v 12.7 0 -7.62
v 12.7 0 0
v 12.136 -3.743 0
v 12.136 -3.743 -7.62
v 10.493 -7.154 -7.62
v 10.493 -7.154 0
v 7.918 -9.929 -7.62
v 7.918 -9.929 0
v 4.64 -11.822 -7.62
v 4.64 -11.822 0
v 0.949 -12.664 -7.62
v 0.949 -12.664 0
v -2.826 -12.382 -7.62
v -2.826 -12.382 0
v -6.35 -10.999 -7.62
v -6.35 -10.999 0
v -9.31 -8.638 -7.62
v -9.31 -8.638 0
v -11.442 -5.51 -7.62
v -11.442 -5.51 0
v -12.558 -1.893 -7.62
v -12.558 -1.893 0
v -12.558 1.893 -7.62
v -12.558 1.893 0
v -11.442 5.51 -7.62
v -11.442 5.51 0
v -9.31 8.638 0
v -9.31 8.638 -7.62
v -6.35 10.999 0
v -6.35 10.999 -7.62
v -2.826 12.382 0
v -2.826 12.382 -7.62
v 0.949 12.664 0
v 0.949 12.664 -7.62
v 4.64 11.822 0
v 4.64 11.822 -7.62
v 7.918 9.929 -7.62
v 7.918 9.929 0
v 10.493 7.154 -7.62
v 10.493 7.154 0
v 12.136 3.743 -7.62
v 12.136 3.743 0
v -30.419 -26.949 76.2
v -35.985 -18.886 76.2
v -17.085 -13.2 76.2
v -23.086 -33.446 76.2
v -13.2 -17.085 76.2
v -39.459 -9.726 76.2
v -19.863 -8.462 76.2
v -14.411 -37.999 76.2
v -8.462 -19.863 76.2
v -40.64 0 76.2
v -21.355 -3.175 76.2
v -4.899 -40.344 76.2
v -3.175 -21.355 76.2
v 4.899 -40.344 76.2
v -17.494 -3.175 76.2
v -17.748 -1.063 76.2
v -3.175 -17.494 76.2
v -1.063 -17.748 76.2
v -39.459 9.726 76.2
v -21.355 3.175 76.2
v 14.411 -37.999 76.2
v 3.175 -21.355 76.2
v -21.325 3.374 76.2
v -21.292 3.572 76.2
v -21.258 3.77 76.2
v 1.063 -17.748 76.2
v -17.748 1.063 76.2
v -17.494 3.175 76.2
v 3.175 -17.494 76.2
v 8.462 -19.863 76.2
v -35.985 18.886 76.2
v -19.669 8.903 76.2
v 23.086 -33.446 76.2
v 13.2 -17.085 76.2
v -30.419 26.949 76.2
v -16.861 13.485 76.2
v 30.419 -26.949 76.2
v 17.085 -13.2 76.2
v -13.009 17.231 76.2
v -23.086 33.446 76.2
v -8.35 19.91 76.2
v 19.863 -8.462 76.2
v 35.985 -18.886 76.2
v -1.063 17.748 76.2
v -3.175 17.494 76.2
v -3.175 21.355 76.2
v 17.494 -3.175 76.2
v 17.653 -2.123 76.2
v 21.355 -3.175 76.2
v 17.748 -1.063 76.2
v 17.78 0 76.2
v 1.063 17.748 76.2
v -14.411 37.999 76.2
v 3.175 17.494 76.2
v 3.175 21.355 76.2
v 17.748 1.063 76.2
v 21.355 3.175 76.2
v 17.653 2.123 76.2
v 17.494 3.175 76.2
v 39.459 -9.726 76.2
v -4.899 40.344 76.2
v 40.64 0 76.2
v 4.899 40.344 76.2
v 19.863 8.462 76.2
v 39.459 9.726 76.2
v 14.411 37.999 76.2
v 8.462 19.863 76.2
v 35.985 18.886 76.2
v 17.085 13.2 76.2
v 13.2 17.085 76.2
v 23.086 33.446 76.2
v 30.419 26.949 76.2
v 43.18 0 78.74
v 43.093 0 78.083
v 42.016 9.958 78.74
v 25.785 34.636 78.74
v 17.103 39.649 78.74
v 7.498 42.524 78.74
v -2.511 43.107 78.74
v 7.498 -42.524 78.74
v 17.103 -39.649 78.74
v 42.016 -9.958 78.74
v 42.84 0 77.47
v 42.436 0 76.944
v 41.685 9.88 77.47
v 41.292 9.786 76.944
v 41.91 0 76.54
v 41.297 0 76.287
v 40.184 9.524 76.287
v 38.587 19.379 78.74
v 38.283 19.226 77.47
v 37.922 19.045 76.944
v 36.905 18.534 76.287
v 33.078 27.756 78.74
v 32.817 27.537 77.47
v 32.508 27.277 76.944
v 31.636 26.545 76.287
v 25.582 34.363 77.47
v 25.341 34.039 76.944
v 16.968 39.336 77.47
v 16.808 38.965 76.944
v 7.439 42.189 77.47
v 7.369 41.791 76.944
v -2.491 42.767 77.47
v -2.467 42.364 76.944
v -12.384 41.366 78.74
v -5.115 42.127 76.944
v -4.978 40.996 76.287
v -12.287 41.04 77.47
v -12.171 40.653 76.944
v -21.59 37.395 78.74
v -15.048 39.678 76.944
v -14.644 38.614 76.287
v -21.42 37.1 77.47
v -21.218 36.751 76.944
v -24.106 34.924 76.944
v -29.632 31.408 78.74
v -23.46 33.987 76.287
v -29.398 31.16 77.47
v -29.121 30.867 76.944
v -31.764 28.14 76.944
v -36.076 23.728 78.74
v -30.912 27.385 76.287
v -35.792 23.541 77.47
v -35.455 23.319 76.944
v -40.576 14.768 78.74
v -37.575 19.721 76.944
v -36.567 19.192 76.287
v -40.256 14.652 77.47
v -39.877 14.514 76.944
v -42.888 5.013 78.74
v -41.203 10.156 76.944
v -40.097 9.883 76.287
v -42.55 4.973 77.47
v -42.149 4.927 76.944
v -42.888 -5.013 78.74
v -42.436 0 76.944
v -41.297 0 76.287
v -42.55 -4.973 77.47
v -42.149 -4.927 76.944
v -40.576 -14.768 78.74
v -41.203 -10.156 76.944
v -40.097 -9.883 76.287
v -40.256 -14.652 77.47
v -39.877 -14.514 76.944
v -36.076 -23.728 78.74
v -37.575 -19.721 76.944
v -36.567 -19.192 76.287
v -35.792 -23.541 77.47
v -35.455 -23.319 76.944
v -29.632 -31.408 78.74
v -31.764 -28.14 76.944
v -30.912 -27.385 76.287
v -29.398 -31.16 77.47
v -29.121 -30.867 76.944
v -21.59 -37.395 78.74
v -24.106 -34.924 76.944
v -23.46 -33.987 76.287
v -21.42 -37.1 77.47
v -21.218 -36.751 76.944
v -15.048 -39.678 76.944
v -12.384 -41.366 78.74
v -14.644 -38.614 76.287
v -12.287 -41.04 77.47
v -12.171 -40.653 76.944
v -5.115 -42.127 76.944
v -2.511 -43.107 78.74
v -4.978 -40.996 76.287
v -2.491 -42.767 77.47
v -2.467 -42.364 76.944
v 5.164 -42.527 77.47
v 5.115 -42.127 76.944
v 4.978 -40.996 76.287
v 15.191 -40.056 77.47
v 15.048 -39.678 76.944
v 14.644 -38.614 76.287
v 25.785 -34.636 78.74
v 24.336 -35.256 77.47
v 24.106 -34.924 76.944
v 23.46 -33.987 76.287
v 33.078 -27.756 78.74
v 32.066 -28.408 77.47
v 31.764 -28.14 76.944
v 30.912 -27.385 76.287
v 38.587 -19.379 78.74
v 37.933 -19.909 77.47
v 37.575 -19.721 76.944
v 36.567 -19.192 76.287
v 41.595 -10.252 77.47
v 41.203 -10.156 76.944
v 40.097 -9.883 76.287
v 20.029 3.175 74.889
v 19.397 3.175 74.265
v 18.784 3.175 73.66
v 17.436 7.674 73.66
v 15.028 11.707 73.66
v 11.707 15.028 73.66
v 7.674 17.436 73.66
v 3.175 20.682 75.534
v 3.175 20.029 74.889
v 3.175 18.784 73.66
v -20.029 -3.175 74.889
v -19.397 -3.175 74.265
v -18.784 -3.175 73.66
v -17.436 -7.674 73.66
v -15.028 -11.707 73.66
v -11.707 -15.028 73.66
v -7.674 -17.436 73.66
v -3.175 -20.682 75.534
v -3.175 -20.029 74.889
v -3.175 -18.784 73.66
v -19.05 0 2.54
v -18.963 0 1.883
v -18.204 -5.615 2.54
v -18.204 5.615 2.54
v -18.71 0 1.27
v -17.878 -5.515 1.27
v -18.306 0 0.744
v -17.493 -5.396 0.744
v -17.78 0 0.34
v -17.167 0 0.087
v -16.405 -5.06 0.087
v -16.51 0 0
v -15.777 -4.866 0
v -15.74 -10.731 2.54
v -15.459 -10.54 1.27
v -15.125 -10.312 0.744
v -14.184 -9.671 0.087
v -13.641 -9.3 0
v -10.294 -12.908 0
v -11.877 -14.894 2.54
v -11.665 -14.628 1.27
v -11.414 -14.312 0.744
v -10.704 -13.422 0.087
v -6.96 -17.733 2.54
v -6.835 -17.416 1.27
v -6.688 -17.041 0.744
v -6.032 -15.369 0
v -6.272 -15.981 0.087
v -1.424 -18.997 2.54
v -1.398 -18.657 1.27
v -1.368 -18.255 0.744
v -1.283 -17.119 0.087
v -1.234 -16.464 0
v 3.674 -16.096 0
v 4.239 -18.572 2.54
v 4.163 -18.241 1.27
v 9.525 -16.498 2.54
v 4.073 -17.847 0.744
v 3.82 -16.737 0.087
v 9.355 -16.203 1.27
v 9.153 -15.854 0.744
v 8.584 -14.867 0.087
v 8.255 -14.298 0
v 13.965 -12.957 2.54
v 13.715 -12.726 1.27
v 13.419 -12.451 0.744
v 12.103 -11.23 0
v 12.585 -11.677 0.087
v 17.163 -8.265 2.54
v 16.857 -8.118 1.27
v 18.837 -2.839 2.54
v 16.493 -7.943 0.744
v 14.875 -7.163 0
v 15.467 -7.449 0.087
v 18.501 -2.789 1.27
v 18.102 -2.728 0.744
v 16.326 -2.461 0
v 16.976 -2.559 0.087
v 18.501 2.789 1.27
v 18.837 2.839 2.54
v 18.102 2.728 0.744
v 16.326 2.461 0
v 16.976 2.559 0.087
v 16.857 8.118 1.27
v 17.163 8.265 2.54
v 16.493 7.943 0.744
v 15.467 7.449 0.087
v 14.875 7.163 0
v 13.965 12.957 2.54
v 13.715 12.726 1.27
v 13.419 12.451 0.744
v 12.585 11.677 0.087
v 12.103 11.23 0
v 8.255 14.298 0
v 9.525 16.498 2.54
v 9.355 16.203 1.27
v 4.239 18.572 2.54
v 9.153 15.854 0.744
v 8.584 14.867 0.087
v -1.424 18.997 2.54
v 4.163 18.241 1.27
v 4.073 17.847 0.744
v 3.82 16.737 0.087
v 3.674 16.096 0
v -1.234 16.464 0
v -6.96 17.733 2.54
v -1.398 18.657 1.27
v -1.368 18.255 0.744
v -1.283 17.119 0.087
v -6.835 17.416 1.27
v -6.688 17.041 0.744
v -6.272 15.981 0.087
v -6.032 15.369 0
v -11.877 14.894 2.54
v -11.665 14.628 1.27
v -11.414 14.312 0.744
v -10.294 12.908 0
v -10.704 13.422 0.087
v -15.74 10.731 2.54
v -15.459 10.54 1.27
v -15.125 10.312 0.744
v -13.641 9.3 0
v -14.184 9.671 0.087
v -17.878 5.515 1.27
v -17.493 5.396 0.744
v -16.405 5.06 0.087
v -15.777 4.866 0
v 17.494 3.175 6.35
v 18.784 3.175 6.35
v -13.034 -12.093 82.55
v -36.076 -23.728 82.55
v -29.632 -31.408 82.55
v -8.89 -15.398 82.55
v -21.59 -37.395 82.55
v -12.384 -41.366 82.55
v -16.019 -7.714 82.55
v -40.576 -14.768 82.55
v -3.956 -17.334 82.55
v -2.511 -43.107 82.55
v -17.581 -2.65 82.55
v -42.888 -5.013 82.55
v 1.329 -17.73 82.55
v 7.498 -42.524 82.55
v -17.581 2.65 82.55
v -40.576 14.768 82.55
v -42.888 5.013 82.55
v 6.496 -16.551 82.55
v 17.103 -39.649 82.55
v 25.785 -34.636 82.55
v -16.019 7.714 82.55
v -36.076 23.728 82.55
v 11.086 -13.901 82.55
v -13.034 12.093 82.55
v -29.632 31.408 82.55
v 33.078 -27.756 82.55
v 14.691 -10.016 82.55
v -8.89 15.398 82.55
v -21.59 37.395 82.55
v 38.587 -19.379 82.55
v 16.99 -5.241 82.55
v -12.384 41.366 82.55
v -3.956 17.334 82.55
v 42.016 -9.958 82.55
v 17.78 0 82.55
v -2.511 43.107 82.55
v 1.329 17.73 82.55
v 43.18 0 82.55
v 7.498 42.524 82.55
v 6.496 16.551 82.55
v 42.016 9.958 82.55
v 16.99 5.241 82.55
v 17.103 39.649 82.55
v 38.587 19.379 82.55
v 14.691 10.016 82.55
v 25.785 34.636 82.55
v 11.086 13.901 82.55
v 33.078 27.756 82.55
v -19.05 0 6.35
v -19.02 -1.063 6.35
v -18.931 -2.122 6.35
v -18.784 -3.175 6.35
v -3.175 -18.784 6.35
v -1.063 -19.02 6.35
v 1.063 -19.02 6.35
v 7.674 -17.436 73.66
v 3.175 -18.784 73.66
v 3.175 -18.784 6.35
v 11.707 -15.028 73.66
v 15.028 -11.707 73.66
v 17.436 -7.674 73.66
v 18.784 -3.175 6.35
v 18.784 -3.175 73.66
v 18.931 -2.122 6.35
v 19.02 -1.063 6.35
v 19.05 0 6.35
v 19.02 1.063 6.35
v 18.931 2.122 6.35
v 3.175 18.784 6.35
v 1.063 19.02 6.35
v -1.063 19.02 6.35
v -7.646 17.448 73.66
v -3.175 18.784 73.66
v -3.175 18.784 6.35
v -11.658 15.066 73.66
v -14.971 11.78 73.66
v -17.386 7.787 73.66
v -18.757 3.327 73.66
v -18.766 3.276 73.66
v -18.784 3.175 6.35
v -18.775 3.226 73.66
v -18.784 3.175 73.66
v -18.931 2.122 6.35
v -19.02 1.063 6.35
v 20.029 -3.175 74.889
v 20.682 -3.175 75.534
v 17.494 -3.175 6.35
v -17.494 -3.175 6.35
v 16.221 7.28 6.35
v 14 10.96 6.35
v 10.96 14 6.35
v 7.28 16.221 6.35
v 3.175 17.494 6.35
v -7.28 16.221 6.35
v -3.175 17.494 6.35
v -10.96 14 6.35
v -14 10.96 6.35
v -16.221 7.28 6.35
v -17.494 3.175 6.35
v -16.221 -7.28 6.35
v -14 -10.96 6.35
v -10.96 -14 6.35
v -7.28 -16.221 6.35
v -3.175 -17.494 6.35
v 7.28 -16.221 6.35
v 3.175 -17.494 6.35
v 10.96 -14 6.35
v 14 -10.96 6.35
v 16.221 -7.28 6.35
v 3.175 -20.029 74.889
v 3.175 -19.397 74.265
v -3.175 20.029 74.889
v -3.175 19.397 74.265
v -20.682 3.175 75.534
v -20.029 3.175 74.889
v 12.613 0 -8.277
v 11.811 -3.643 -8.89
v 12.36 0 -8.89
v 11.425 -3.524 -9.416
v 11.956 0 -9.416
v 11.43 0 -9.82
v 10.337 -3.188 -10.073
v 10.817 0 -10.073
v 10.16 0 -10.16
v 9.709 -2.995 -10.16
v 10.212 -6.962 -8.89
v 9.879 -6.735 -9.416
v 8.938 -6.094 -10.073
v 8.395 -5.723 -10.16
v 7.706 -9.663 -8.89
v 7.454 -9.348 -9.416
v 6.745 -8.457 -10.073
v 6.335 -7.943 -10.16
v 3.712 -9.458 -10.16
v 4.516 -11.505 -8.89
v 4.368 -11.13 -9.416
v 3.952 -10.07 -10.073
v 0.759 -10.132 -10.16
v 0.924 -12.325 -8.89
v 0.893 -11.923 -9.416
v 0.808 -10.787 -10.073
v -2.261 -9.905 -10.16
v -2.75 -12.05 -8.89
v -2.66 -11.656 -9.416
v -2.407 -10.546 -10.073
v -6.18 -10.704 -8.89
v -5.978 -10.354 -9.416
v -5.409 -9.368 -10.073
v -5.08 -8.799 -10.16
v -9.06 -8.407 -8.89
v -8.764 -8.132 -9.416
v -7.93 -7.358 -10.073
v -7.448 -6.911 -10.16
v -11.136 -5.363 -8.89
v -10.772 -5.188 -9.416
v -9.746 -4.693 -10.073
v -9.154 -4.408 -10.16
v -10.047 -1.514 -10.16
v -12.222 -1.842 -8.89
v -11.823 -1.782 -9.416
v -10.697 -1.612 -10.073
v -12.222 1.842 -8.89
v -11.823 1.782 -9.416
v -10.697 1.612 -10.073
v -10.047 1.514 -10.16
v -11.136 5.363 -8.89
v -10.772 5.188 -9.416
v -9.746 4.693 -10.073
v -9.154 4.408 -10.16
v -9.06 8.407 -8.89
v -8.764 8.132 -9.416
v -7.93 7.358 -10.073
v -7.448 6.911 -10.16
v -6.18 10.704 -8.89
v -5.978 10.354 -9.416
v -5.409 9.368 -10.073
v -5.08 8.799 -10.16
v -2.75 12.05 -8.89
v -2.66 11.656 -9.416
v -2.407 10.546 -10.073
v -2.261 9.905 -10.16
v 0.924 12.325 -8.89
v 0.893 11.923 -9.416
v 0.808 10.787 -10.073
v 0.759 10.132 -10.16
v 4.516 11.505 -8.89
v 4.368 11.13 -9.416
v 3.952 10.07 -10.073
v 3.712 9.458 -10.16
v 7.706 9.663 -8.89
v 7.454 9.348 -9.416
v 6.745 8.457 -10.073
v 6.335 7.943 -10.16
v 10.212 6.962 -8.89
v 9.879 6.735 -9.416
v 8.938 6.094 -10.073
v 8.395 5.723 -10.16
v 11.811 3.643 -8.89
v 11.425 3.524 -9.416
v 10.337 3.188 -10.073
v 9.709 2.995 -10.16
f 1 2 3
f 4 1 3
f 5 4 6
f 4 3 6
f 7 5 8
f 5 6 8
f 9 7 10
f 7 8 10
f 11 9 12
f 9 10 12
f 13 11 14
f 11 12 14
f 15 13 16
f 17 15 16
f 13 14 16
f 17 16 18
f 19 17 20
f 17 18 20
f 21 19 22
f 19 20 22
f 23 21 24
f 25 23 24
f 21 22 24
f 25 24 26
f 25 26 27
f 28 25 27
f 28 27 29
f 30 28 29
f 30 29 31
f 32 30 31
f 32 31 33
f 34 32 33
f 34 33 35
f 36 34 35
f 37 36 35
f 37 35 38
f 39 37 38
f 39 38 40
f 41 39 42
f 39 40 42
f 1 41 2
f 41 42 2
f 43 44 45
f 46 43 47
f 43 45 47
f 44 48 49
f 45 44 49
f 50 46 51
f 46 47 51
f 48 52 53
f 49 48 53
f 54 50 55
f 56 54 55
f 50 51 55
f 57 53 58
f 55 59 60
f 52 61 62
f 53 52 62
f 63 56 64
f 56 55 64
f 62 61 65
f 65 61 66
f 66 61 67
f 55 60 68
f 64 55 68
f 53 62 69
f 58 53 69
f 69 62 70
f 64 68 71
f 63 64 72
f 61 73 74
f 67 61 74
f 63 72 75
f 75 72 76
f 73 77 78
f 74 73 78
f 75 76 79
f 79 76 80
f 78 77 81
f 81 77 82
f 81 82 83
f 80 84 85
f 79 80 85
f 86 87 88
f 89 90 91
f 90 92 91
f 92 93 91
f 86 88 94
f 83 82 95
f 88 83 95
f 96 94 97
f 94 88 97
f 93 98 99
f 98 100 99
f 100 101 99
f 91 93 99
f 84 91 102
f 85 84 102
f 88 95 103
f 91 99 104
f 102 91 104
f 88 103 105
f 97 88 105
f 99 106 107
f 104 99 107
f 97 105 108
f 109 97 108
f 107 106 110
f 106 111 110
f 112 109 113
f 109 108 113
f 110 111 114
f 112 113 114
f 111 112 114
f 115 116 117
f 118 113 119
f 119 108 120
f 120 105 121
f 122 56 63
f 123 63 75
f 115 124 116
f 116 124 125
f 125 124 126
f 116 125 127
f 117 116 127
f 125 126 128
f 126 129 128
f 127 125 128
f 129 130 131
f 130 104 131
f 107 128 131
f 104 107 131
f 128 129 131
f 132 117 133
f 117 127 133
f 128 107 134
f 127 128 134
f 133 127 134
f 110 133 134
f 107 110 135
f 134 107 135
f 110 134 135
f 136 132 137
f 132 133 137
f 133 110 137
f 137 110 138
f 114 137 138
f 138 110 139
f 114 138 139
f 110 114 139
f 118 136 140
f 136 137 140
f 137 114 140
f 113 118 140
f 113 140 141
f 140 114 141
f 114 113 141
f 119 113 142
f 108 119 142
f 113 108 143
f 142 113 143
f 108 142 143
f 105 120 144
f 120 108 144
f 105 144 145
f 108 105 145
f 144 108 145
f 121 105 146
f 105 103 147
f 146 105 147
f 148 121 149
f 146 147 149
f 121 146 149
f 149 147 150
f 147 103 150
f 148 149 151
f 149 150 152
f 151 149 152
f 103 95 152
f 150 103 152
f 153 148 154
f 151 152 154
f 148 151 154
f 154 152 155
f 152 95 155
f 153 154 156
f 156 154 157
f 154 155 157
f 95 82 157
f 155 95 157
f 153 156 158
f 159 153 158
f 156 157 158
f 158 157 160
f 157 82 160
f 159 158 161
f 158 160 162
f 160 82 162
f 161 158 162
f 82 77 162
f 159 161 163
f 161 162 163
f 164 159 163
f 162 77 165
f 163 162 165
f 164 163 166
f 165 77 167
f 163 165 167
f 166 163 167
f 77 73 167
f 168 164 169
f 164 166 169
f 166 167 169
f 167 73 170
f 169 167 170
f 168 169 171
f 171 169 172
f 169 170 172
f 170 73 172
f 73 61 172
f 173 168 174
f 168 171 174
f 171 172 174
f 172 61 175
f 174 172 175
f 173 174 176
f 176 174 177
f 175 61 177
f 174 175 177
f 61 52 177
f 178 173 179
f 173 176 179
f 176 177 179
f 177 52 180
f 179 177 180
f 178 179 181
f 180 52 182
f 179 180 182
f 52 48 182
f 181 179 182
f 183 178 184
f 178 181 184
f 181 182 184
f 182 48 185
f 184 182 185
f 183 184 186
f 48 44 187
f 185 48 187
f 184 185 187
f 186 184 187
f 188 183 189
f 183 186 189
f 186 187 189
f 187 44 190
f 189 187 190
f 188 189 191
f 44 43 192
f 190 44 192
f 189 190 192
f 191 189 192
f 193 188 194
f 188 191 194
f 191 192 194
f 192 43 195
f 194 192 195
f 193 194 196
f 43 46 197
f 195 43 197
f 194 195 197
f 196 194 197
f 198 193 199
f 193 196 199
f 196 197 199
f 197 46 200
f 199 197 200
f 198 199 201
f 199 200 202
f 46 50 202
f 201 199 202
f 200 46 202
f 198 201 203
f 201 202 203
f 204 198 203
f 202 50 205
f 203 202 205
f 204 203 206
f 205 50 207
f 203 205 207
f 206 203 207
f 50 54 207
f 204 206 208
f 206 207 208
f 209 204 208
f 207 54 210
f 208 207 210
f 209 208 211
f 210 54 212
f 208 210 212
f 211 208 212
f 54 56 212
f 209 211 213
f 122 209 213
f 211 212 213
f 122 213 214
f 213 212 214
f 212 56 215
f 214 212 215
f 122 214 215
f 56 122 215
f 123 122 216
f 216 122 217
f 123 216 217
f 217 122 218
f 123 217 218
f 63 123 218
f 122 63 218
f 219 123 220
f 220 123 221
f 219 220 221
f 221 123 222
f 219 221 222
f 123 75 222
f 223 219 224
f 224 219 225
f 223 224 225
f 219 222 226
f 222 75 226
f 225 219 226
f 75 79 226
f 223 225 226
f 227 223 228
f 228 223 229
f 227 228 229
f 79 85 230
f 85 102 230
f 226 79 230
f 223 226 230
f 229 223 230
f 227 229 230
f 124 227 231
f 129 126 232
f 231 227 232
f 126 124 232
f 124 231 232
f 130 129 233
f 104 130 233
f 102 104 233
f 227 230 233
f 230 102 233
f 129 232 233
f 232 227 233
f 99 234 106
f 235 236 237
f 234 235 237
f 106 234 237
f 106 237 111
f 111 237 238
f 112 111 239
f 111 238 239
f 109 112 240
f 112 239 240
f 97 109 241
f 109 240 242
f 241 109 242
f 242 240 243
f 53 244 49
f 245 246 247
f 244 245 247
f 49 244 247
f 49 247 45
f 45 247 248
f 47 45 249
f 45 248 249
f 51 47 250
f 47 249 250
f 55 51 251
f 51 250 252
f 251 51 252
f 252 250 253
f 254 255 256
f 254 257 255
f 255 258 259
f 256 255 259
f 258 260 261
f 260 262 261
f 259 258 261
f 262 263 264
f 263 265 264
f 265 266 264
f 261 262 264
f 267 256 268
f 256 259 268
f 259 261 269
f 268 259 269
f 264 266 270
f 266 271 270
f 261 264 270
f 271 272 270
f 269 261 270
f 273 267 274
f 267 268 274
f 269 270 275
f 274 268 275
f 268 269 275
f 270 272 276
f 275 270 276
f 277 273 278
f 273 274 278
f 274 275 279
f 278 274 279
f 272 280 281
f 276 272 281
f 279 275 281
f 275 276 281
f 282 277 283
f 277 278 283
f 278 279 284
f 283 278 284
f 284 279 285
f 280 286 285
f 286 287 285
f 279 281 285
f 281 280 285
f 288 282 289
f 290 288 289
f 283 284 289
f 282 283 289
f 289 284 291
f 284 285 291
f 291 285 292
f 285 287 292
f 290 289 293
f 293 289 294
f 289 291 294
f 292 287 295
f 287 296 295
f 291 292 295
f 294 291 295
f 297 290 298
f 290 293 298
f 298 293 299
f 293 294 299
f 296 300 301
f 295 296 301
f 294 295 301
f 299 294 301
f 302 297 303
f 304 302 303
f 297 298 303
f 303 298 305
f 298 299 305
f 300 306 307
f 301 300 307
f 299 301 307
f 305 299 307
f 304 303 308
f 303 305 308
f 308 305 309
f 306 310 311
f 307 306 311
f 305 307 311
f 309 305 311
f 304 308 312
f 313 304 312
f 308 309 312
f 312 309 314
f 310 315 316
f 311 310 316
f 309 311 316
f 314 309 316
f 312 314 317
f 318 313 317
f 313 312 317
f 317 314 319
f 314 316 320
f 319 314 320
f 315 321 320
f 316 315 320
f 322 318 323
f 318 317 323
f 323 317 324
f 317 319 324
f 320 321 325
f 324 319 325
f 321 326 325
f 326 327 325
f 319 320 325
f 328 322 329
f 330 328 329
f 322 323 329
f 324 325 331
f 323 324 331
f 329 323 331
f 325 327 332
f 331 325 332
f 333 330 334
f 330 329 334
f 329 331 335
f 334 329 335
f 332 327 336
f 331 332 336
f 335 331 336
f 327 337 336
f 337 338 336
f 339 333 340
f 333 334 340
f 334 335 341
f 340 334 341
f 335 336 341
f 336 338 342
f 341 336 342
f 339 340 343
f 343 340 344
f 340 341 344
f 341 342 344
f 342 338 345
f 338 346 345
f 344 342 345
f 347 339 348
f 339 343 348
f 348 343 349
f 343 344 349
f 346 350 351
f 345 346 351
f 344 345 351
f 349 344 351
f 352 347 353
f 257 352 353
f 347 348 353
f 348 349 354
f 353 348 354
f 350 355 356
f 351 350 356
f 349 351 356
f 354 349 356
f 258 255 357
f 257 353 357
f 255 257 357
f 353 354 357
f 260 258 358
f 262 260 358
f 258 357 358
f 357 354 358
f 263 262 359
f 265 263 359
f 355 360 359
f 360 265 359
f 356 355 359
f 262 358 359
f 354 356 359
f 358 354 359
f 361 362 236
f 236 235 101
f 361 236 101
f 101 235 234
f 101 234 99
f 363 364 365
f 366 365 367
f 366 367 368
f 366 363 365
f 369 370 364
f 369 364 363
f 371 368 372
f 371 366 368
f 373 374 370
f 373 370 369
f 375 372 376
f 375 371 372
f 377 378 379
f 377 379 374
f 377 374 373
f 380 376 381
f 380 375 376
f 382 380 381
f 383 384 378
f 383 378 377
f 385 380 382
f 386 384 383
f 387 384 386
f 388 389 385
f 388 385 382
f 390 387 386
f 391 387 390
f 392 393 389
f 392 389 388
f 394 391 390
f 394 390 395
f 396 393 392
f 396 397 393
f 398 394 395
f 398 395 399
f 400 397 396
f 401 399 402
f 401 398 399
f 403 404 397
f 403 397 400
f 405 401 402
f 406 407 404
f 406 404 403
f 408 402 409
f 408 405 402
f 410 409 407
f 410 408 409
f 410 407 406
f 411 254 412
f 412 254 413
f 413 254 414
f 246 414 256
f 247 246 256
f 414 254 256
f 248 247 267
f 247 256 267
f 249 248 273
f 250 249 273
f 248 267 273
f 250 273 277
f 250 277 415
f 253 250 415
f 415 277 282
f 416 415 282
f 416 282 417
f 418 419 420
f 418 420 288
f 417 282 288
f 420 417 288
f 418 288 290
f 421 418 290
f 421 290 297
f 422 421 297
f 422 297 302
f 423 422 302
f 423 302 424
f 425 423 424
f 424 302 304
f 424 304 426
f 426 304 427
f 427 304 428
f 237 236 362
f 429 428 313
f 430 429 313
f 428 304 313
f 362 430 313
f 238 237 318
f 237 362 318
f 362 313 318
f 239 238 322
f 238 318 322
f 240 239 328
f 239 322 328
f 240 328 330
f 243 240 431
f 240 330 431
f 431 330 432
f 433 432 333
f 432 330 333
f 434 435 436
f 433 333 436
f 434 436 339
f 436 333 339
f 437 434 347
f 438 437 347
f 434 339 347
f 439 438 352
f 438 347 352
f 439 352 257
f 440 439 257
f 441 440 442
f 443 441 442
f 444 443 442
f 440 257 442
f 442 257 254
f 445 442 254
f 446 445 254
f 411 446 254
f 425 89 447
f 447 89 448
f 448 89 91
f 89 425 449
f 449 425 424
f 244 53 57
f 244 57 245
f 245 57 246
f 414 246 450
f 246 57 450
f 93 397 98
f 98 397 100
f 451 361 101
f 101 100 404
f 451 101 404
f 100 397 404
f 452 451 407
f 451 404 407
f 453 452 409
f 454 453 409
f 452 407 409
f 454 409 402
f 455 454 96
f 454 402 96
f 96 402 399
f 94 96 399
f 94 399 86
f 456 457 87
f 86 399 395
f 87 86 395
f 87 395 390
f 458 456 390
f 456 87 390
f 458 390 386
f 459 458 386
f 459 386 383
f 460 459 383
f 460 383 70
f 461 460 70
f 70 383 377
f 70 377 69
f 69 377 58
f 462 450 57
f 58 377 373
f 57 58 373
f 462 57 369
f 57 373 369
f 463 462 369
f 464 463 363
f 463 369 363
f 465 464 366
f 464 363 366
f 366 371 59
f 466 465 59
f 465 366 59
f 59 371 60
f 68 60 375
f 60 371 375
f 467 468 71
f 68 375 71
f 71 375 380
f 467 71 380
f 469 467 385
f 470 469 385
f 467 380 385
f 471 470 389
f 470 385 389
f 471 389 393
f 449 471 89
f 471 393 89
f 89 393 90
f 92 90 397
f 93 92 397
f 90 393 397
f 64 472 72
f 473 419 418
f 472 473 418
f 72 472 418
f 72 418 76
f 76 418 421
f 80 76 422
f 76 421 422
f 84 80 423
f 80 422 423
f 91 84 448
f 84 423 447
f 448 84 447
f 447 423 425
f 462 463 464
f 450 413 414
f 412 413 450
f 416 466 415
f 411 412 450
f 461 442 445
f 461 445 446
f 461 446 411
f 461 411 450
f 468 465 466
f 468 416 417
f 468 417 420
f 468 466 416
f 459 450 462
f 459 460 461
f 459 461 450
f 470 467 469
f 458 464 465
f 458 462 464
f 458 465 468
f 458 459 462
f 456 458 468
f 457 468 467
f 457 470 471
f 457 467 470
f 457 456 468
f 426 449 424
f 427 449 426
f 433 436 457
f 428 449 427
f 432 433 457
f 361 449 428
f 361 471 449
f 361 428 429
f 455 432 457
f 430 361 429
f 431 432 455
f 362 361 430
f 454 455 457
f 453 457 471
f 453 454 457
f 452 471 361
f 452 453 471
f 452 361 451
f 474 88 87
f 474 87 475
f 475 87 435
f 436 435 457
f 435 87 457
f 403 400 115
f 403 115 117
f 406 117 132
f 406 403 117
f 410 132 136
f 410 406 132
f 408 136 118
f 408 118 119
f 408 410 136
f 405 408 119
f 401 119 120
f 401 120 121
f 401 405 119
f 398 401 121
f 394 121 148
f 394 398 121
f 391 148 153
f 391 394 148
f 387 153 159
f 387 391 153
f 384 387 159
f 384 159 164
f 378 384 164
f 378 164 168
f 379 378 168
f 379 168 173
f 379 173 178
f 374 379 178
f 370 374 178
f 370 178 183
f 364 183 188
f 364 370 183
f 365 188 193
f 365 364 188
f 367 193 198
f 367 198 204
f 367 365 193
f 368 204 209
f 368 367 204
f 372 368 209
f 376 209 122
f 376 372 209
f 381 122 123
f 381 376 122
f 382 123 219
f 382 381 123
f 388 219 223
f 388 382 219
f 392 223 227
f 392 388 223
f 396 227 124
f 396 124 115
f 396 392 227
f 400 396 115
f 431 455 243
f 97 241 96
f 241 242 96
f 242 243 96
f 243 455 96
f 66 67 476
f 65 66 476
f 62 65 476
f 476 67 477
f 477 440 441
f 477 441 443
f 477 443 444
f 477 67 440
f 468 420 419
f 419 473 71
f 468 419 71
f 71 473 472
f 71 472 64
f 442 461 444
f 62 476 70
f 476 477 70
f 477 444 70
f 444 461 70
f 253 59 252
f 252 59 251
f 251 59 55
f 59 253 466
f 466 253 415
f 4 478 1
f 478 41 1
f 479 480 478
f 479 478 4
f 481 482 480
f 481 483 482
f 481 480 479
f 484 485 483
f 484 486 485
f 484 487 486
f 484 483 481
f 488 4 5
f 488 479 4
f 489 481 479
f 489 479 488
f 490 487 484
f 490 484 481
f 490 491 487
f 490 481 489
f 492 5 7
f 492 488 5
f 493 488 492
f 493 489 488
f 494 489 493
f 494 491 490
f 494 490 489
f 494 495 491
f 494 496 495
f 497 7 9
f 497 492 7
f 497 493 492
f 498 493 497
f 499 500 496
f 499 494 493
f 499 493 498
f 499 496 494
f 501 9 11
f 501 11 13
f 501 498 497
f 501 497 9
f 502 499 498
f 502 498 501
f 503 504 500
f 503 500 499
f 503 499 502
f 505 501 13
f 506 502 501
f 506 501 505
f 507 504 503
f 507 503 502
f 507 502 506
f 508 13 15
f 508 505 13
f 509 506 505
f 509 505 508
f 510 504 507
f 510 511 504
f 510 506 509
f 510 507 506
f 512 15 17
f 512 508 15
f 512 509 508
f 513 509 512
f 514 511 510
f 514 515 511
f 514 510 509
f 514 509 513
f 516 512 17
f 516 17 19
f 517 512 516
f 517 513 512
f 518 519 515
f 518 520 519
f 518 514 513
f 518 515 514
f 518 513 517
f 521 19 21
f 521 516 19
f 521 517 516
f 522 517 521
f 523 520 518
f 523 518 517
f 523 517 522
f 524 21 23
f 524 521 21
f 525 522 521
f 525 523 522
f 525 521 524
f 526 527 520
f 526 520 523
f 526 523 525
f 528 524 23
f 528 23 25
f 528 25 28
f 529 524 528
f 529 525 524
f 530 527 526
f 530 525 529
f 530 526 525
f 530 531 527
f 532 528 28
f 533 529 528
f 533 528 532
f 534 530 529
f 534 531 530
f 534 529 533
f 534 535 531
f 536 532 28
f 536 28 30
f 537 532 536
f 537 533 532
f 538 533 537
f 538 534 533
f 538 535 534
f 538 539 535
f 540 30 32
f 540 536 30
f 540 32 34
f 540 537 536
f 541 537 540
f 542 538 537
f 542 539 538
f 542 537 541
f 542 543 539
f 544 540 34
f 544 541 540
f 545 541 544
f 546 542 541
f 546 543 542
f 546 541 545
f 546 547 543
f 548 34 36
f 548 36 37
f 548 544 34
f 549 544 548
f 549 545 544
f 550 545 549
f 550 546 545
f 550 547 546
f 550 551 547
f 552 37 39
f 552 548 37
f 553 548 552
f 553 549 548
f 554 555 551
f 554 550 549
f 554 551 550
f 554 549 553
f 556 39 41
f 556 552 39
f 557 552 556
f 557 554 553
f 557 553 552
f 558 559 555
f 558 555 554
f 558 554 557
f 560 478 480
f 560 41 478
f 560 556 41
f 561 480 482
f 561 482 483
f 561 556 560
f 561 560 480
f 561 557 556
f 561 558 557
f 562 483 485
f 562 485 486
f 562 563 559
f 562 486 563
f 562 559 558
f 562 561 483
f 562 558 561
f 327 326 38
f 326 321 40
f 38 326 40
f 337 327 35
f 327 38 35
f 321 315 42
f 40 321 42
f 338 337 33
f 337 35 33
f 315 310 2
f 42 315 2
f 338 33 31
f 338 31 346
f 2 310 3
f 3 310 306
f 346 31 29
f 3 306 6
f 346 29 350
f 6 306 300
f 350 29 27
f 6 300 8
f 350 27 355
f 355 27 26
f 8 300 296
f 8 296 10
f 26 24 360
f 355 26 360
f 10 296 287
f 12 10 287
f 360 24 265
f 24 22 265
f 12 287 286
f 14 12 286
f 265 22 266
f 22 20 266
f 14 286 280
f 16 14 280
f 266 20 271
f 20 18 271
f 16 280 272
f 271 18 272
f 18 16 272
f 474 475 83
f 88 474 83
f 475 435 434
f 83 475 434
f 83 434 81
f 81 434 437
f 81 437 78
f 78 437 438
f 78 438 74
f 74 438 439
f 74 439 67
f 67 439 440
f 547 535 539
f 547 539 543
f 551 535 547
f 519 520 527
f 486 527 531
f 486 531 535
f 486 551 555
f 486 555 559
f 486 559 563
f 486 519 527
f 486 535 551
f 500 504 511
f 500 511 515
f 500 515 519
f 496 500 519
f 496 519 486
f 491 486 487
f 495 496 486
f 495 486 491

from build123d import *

# Parameters (mm, degrees)
SKETCH1_R           = 19.05
BOSS_EXTRUDE1_DEPTH = 76.2
SKETCH2_R           = 17.78
CUT_EXTRUDE1_DEPTH  = 69.85
CUT_EXTRUDE2_DEPTH  = 69.85
BOSS_EXTRUDE2_START = 6.35
SKETCH4_R           = 43.18
SKETCH4_R_2         = 17.78
BOSS_EXTRUDE2_DEPTH = 6.35
SKETCH5_R           = 12.7
BOSS_EXTRUDE3_DEPTH = 10.16
FILLET1_R           = 2.54
CHAMFER1_SIZE       = 2.54


with BuildPart() as part:
    # Sketch1 → Boss-Extrude1 (new body)
    with BuildSketch(Plane.XY):
        with Locations(Location((0, 0, 0), (0, 0, 180))):
            Circle(SKETCH1_R)
    extrude(amount=BOSS_EXTRUDE1_DEPTH)

    # Sketch2 → Cut-Extrude1 (cut)
    with BuildSketch(Plane.XY.offset(76.2)):
        Circle(SKETCH2_R)
    extrude(amount=-CUT_EXTRUDE1_DEPTH, mode=Mode.SUBTRACT)

    # Sketch3 → Cut-Extrude2 (cut)
    with BuildSketch(Plane.XY.offset(76.2)):
        with BuildLine():
            Line((-17.494221189, 3.175), (-18.783553311, 3.175))
            ThreePointArc((-18.783553311, 3.175), (-19.05, 0), (-18.783553311, -3.175))
            Line((-18.783553311, -3.175), (-17.494221189, -3.175))
            ThreePointArc((-17.494221189, -3.175), (-17.78, 0), (-17.494221189, 3.175))
        make_face()
        with BuildLine():
            ThreePointArc((19.05, 0), (18.983271459, 1.593080258), (18.783553311, 3.175))
            Line((18.783553311, 3.175), (17.494221189, 3.175))
            ThreePointArc((17.494221189, 3.175), (17.708411176, 1.593917699), (17.78, 0))
            ThreePointArc((17.78, 0), (17.708411176, -1.593917699), (17.494221189, -3.175))
            Line((17.494221189, -3.175), (18.783553311, -3.175))
            ThreePointArc((18.783553311, -3.175), (18.983271459, -1.593080258), (19.05, 0))
        make_face()
        with BuildLine():
            ThreePointArc((3.175, 18.783553311), (0, 19.05), (-3.175, 18.783553311))
            Line((-3.175, 18.783553311), (-3.175, 17.494221189))
            ThreePointArc((-3.175, 17.494221189), (0, 17.78), (3.175, 17.494221189))
            Line((3.175, 17.494221189), (3.175, 18.783553311))
        make_face()
        with BuildLine():
            Line((-3.175, -17.494221189), (-3.175, -18.783553311))
            ThreePointArc((-3.175, -18.783553311), (0, -19.05), (3.175, -18.783553311))
            Line((3.175, -18.783553311), (3.175, -17.494221189))
            ThreePointArc((3.175, -17.494221189), (0, -17.78), (-3.175, -17.494221189))
        make_face()
    extrude(amount=-CUT_EXTRUDE2_DEPTH, mode=Mode.SUBTRACT)

    # Sketch4 → Boss-Extrude2 (add)
    with BuildSketch(Plane.XY.offset(76.2).offset(BOSS_EXTRUDE2_START)):
        Circle(SKETCH4_R)
        Circle(SKETCH4_R_2, mode=Mode.SUBTRACT)
    extrude(amount=-BOSS_EXTRUDE2_DEPTH)

    # Sketch5 → Boss-Extrude3 (add)
    with BuildSketch(Plane(origin=(0, 0, 0), x_dir=(-1, 0, 0), z_dir=(0, 0, -1))):
        with Locations(Location((0, 0, 0), (0, 0, 180))):
            Circle(SKETCH5_R)
    extrude(amount=BOSS_EXTRUDE3_DEPTH)

    # Fillet1
    fillet1_edges = [part.edges().sort_by_distance(p)[0] for p in [
        (19.05, 0, 0),
        (-43.18, 0, 76.2),
        (-12.7, 0, -10.16),
    ]]
    fillet(fillet1_edges, radius=FILLET1_R)

    # Chamfer1
    # the kernel refuses this chamfer: 2.54 mm, written as the material it adds along each edge
    with BuildSketch(Plane(origin=(0, 0, 76.2), x_dir=(-0.9846344295499855, 0.1746282913641848, 0), z_dir=(0.1746282913641848, 0.9846344295499855, 0))) as chamfer1_piece_1_section:
        Polygon((19.05 + CHAMFER1_SIZE, 0), (19.05, -CHAMFER1_SIZE), (19.05, 0), align=None)
    chamfer1_piece_1 = revolve(axis=Axis((0, 0, 76.2), (0, 0, 1)), revolution_arc=110.114055389, mode=Mode.PRIVATE)
    chamfer1_piece_1 = split(chamfer1_piece_1, bisect_by=Plane(origin=(-19.847264072, 3.175, 75.490542074), z_dir=(0, 1, 0)), keep=Keep.TOP, mode=Mode.PRIVATE)
    add(chamfer1_piece_1)
    with BuildSketch(Plane(origin=(0, 0, 76.2), x_dir=(-0.9846344295499855, 0.1746282913641848, 0), z_dir=(0.1746282913641848, 0.9846344295499855, 0))) as chamfer1_piece_2_section:
        Polygon((19.05 + CHAMFER1_SIZE, 0), (19.05, -CHAMFER1_SIZE), (19.05, 0), align=None)
    chamfer1_piece_2 = revolve(axis=Axis((0, 0, 76.2), (0, 0, 1)), revolution_arc=110.114055389, mode=Mode.PRIVATE)
    chamfer1_piece_2 = split(chamfer1_piece_2, bisect_by=Plane(origin=(-14.346148442, -3.175, 74.961482306), z_dir=(0, -1, 0)), keep=Keep.TOP, mode=Mode.PRIVATE)
    chamfer1_piece_2 = split(chamfer1_piece_2, bisect_by=Plane(origin=(-3.175, -14.346148442, 74.961482306), z_dir=(-1, 0, 0)), keep=Keep.TOP, mode=Mode.PRIVATE)
    add(chamfer1_piece_2)
    with BuildSketch(Plane(origin=(0, 0, 76.2), x_dir=(-0.9846344295499855, 0.1746282913641848, 0), z_dir=(0.1746282913641848, 0.9846344295499855, 0))) as chamfer1_piece_3_section:
        Polygon((19.05 + CHAMFER1_SIZE, 0), (19.05, -CHAMFER1_SIZE), (19.05, 0), align=None)
    chamfer1_piece_3 = revolve(axis=Axis((0, 0, 76.2), (0, 0, 1)), revolution_arc=110.114055389, mode=Mode.PRIVATE)
    chamfer1_piece_3 = split(chamfer1_piece_3, bisect_by=Plane(origin=(3.175, -19.847263843, 75.490541907), z_dir=(1, 0, 0)), keep=Keep.TOP, mode=Mode.PRIVATE)
    add(chamfer1_piece_3)
    with BuildSketch(Plane(origin=(0, 0, 76.2), x_dir=(0.9846344295499821, -0.1746282913642033, 0), z_dir=(-0.1746282913642033, -0.9846344295499821, 0))) as chamfer1_piece_4_section:
        Polygon((19.05 + CHAMFER1_SIZE, 0), (19.05, -CHAMFER1_SIZE), (19.05, 0), align=None)
    chamfer1_piece_4 = revolve(axis=Axis((0, 0, 76.2), (0, 0, 1)), revolution_arc=110.114055389, mode=Mode.PRIVATE)
    chamfer1_piece_4 = split(chamfer1_piece_4, bisect_by=Plane(origin=(19.847264072, -3.175, 75.490542074), z_dir=(0, -1, 0)), keep=Keep.TOP, mode=Mode.PRIVATE)
    add(chamfer1_piece_4)
    with BuildSketch(Plane(origin=(0, 0, 76.2), x_dir=(0.9846344295499821, -0.1746282913642033, 0), z_dir=(-0.1746282913642033, -0.9846344295499821, 0))) as chamfer1_piece_5_section:
        Polygon((19.05 + CHAMFER1_SIZE, 0), (19.05, -CHAMFER1_SIZE), (19.05, 0), align=None)
    chamfer1_piece_5 = revolve(axis=Axis((0, 0, 76.2), (0, 0, 1)), revolution_arc=110.114055389, mode=Mode.PRIVATE)
    chamfer1_piece_5 = split(chamfer1_piece_5, bisect_by=Plane(origin=(14.346148442, 3.175, 74.961482306), z_dir=(0, 1, 0)), keep=Keep.TOP, mode=Mode.PRIVATE)
    chamfer1_piece_5 = split(chamfer1_piece_5, bisect_by=Plane(origin=(3.175, 14.346148442, 74.961482306), z_dir=(1, 0, 0)), keep=Keep.TOP, mode=Mode.PRIVATE)
    add(chamfer1_piece_5)
    with BuildSketch(Plane(origin=(0, 0, 76.2), x_dir=(0.9846344295499821, -0.1746282913642033, 0), z_dir=(-0.1746282913642033, -0.9846344295499821, 0))) as chamfer1_piece_6_section:
        Polygon((19.05 + CHAMFER1_SIZE, 0), (19.05, -CHAMFER1_SIZE), (19.05, 0), align=None)
    chamfer1_piece_6 = revolve(axis=Axis((0, 0, 76.2), (0, 0, 1)), revolution_arc=110.114055389, mode=Mode.PRIVATE)
    chamfer1_piece_6 = split(chamfer1_piece_6, bisect_by=Plane(origin=(-3.175, 19.847263843, 75.490541907), z_dir=(-1, 0, 0)), keep=Keep.TOP, mode=Mode.PRIVATE)
    add(chamfer1_piece_6)
    with BuildSketch(Plane(origin=(0, 0, 76.2), x_dir=(0.1746282913641894, 0.9846344295499847, 0), z_dir=(0.9846344295499847, -0.1746282913641894, 0))) as chamfer1_piece_7_section:
        Polygon((19.05 + CHAMFER1_SIZE, 0), (19.05, -CHAMFER1_SIZE), (19.05, 0), align=None)
    chamfer1_piece_7 = revolve(axis=Axis((0, 0, 76.2), (0, 0, 1)), revolution_arc=110.114055389, mode=Mode.PRIVATE)
    chamfer1_piece_7 = split(chamfer1_piece_7, bisect_by=Plane(origin=(3.175, 19.847264072, 75.490542074), z_dir=(1, 0, 0)), keep=Keep.TOP, mode=Mode.PRIVATE)
    add(chamfer1_piece_7)
    with BuildSketch(Plane(origin=(0, 0, 76.2), x_dir=(0.1746282913641894, 0.9846344295499847, 0), z_dir=(0.9846344295499847, -0.1746282913641894, 0))) as chamfer1_piece_8_section:
        Polygon((19.05 + CHAMFER1_SIZE, 0), (19.05, -CHAMFER1_SIZE), (19.05, 0), align=None)
    chamfer1_piece_8 = revolve(axis=Axis((0, 0, 76.2), (0, 0, 1)), revolution_arc=110.114055389, mode=Mode.PRIVATE)
    chamfer1_piece_8 = split(chamfer1_piece_8, bisect_by=Plane(origin=(-3.175, 14.346148442, 74.961482306), z_dir=(-1, 0, 0)), keep=Keep.TOP, mode=Mode.PRIVATE)
    chamfer1_piece_8 = split(chamfer1_piece_8, bisect_by=Plane(origin=(-14.346148442, 3.175, 74.961482306), z_dir=(0, 1, 0)), keep=Keep.TOP, mode=Mode.PRIVATE)
    add(chamfer1_piece_8)
    with BuildSketch(Plane(origin=(0, 0, 76.2), x_dir=(0.1746282913641894, 0.9846344295499847, 0), z_dir=(0.9846344295499847, -0.1746282913641894, 0))) as chamfer1_piece_9_section:
        Polygon((19.05 + CHAMFER1_SIZE, 0), (19.05, -CHAMFER1_SIZE), (19.05, 0), align=None)
    chamfer1_piece_9 = revolve(axis=Axis((0, 0, 76.2), (0, 0, 1)), revolution_arc=110.114055389, mode=Mode.PRIVATE)
    chamfer1_piece_9 = split(chamfer1_piece_9, bisect_by=Plane(origin=(-19.847263843, -3.175, 75.490541907), z_dir=(0, -1, 0)), keep=Keep.TOP, mode=Mode.PRIVATE)
    add(chamfer1_piece_9)
    with BuildSketch(Plane(origin=(0, 0, 76.2), x_dir=(-0.1746282913641849, -0.9846344295499855, 0), z_dir=(-0.9846344295499855, 0.1746282913641849, 0))) as chamfer1_piece_10_section:
        Polygon((19.05 + CHAMFER1_SIZE, 0), (19.05, -CHAMFER1_SIZE), (19.05, 0), align=None)
    chamfer1_piece_10 = revolve(axis=Axis((0, 0, 76.2), (0, 0, 1)), revolution_arc=110.114055389, mode=Mode.PRIVATE)
    chamfer1_piece_10 = split(chamfer1_piece_10, bisect_by=Plane(origin=(-3.175, -19.847264072, 75.490542074), z_dir=(-1, 0, 0)), keep=Keep.TOP, mode=Mode.PRIVATE)
    add(chamfer1_piece_10)
    with BuildSketch(Plane(origin=(0, 0, 76.2), x_dir=(-0.1746282913641849, -0.9846344295499855, 0), z_dir=(-0.9846344295499855, 0.1746282913641849, 0))) as chamfer1_piece_11_section:
        Polygon((19.05 + CHAMFER1_SIZE, 0), (19.05, -CHAMFER1_SIZE), (19.05, 0), align=None)
    chamfer1_piece_11 = revolve(axis=Axis((0, 0, 76.2), (0, 0, 1)), revolution_arc=110.114055389, mode=Mode.PRIVATE)
    chamfer1_piece_11 = split(chamfer1_piece_11, bisect_by=Plane(origin=(3.175, -14.346148442, 74.961482306), z_dir=(1, 0, 0)), keep=Keep.TOP, mode=Mode.PRIVATE)
    chamfer1_piece_11 = split(chamfer1_piece_11, bisect_by=Plane(origin=(14.346148442, -3.175, 74.961482306), z_dir=(0, -1, 0)), keep=Keep.TOP, mode=Mode.PRIVATE)
    add(chamfer1_piece_11)
    with BuildSketch(Plane(origin=(0, 0, 76.2), x_dir=(-0.1746282913641849, -0.9846344295499855, 0), z_dir=(-0.9846344295499855, 0.1746282913641849, 0))) as chamfer1_piece_12_section:
        Polygon((19.05 + CHAMFER1_SIZE, 0), (19.05, -CHAMFER1_SIZE), (19.05, 0), align=None)
    chamfer1_piece_12 = revolve(axis=Axis((0, 0, 76.2), (0, 0, 1)), revolution_arc=110.114055389, mode=Mode.PRIVATE)
    chamfer1_piece_12 = split(chamfer1_piece_12, bisect_by=Plane(origin=(19.847263843, 3.175, 75.490541907), z_dir=(0, 1, 0)), keep=Keep.TOP, mode=Mode.PRIVATE)
    add(chamfer1_piece_12)


solid = part.part
